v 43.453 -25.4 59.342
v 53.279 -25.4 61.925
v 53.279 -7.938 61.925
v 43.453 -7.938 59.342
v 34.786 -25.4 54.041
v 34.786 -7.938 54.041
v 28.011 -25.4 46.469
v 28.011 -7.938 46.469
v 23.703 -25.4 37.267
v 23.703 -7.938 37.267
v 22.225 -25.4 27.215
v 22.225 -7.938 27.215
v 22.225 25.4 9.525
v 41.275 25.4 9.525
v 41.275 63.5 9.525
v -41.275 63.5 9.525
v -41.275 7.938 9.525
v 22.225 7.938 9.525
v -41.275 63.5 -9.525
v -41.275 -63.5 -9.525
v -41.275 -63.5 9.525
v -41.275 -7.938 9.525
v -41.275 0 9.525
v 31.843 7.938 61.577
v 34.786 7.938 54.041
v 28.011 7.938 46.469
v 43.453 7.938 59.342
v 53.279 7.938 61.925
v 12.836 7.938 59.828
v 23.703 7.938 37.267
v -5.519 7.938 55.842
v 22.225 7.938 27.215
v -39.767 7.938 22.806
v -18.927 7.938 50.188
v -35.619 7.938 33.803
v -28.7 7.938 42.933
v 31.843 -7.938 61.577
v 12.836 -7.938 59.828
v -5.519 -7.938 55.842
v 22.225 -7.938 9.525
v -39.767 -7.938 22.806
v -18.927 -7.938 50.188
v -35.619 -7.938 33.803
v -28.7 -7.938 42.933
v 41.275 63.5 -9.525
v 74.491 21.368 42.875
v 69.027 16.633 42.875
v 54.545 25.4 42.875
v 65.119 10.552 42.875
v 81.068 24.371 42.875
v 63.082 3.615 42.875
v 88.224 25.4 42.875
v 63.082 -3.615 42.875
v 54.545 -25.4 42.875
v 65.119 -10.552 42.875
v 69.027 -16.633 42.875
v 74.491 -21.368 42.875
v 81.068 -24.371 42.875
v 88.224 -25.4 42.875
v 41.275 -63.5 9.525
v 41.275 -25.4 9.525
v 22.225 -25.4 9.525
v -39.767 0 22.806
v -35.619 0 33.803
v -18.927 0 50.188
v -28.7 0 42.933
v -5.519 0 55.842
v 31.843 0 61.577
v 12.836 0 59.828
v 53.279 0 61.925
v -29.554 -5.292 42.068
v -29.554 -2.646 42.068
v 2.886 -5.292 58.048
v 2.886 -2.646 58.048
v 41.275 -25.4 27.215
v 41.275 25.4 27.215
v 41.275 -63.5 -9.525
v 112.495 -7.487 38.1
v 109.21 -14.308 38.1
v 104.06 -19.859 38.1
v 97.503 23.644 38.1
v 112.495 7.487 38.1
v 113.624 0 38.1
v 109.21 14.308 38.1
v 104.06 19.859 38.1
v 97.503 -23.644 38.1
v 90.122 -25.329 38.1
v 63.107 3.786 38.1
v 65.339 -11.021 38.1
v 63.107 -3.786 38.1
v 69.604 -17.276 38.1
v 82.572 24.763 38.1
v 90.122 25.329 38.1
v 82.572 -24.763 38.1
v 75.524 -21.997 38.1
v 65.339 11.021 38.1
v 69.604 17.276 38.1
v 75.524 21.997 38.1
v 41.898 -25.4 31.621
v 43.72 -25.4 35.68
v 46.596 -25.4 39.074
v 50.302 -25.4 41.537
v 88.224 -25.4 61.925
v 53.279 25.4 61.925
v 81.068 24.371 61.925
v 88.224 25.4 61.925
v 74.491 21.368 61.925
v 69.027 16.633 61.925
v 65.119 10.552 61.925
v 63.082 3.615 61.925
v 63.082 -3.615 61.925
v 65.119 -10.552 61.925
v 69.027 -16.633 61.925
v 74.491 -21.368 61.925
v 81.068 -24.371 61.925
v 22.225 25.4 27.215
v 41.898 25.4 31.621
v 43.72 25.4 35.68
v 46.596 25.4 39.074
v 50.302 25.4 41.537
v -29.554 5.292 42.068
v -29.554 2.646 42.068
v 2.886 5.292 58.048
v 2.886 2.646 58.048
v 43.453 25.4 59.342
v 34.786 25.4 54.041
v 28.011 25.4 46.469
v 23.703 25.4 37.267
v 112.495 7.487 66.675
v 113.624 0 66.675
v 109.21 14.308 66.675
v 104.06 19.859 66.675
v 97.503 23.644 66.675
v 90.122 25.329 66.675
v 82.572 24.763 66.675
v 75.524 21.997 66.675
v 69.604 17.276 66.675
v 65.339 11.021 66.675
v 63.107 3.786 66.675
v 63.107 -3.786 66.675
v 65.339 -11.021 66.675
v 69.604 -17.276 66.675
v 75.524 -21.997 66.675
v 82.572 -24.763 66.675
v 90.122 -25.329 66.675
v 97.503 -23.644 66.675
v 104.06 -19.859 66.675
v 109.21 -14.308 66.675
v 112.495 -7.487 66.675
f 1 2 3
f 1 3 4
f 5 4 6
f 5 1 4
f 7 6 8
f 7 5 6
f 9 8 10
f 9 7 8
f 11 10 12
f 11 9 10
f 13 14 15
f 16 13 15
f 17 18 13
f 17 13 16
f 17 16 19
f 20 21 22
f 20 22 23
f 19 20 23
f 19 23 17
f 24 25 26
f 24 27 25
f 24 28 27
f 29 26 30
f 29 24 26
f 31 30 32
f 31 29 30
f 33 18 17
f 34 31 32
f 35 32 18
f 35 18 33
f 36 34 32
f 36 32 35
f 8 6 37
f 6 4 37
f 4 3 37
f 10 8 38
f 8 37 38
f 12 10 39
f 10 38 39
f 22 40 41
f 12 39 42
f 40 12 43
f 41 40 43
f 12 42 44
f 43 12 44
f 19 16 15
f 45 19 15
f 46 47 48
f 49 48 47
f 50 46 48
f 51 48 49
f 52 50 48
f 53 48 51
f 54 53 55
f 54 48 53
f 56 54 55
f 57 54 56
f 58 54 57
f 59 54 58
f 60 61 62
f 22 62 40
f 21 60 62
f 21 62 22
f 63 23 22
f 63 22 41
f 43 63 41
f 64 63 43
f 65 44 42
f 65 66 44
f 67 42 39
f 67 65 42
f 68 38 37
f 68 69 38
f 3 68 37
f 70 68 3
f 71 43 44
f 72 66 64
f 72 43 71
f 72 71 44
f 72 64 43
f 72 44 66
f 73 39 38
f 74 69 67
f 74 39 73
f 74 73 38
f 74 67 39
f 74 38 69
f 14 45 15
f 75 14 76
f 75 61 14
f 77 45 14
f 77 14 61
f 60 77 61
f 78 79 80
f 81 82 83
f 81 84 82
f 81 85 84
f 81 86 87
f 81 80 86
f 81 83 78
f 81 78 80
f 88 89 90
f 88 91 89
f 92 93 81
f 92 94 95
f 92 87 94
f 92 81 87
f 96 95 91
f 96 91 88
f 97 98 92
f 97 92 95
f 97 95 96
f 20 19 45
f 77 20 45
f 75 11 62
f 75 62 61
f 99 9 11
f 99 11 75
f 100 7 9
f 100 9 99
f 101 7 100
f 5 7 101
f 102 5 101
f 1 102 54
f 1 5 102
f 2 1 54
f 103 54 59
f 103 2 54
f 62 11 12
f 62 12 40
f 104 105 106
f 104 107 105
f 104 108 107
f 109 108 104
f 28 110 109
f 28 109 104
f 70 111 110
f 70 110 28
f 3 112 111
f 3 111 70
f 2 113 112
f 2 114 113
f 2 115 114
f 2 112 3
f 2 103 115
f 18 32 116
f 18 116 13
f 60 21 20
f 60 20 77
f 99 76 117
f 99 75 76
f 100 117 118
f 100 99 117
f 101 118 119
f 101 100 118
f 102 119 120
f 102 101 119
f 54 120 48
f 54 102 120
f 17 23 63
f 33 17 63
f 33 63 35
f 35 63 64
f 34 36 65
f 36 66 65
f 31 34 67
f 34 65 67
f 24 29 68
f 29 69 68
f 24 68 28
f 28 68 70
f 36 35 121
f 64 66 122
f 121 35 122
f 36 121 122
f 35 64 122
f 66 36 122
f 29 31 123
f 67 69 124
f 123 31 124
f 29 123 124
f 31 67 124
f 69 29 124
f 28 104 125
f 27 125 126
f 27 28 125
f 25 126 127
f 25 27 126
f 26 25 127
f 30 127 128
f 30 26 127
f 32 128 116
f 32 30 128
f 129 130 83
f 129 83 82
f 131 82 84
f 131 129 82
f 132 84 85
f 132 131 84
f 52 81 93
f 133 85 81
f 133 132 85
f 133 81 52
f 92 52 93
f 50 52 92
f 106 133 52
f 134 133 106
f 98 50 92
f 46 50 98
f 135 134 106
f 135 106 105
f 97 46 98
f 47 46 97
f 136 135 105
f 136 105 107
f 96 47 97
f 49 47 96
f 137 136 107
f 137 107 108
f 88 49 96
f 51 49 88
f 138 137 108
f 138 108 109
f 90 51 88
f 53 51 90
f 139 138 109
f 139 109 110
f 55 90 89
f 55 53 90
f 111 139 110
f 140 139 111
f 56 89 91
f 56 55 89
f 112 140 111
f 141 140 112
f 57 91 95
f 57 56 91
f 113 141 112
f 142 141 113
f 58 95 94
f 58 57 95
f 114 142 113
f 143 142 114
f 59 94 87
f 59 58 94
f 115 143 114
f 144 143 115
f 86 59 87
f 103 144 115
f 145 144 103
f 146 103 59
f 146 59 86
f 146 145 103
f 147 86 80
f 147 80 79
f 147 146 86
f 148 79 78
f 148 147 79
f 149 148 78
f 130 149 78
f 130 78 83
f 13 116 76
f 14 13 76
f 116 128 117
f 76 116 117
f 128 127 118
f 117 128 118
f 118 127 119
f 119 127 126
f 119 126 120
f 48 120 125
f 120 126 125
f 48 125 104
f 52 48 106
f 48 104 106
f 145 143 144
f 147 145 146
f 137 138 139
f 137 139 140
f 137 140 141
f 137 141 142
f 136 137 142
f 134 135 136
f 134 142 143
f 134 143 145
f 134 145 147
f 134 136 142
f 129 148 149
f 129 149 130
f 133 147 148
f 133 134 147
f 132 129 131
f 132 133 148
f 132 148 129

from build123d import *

# Parameters (mm, degrees)
F1_DEPTH = 63.5
F0_W     = 25.4
F0_H     = 19.05
F2_DEPTH = 25.4
F3_DEPTH = 7.9375


with BuildPart() as f1:
    # F0 (on Front) → F1 (new body, symmetric)
    with BuildSketch(Plane.XZ):
        Polygon((-41.275, 9.525), (-41.275, -9.525), (41.275, -9.525), (41.275, 9.525), (22.225, 9.525), align=None)
    extrude(amount=F1_DEPTH, both=True)

    # F0 (on Front) → F2 (join, symmetric)
    with BuildSketch(Plane.XZ):
        with Locations((75.5235318422, 52.4002)):
            Rectangle(F0_W, F0_H)
        with BuildLine():
            Line((22.225, 9.525), (41.275, 9.525))
            Line((41.275, 9.525), (41.275, 27.2153939429))
            ThreePointArc((41.275, 27.2153939429), (45.0386370244, 37.4784593657), (54.5449857479, 42.8752))
            Line((54.5449857479, 42.8752), (62.8235318422, 42.8752))
            Line((62.8235318422, 42.8752), (62.8235318422, 61.9252))
            Line((62.8235318422, 61.9252), (53.2789551181, 61.9252))
            ThreePointArc((53.2789551181, 61.9252), (31.1216321343, 50.5022935057), (22.225, 27.2153939429))
            Line((22.225, 27.2153939429), (22.225, 9.525))
        make_face()
    extrude(amount=F2_DEPTH, both=True)

    # F0 (on Front) → F3 (join, symmetric)
    with BuildSketch(Plane.XZ):
        with BuildLine():
            add(Edge.make_bspline(
                [(-41.275, 9.525), (-40.8366508782, 51.8352910876), (-5.1678125747, 62.6129284501), (53.2789551181, 61.9252)],
                knots=[0, 0, 0, 0, 108.1028740992, 108.1028740992, 108.1028740992, 108.1028740992], degree=3))
            Line((-41.275, 9.525), (22.225, 9.525))
            Line((22.225, 9.525), (22.225, 27.2153939429))
            ThreePointArc((22.225, 27.2153939429), (31.1216321343, 50.5022935057), (53.2789551181, 61.9252))
        make_face()
    extrude(amount=F3_DEPTH, both=True)

    # F0 (on Front) → F4 (revolve)
    with BuildSketch(Plane.XZ):
        Polygon((88.2235318422, 66.675), (88.2235318422, 61.9252), (88.2235318422, 42.8752), (88.2235318422, 38.1), (113.6235318422, 38.1), (113.6235318422, 66.675), align=None)
    revolve(axis=Axis((88.2235318422, 0, 52.3875), (0, 0, 1)))


solid = f1.part
